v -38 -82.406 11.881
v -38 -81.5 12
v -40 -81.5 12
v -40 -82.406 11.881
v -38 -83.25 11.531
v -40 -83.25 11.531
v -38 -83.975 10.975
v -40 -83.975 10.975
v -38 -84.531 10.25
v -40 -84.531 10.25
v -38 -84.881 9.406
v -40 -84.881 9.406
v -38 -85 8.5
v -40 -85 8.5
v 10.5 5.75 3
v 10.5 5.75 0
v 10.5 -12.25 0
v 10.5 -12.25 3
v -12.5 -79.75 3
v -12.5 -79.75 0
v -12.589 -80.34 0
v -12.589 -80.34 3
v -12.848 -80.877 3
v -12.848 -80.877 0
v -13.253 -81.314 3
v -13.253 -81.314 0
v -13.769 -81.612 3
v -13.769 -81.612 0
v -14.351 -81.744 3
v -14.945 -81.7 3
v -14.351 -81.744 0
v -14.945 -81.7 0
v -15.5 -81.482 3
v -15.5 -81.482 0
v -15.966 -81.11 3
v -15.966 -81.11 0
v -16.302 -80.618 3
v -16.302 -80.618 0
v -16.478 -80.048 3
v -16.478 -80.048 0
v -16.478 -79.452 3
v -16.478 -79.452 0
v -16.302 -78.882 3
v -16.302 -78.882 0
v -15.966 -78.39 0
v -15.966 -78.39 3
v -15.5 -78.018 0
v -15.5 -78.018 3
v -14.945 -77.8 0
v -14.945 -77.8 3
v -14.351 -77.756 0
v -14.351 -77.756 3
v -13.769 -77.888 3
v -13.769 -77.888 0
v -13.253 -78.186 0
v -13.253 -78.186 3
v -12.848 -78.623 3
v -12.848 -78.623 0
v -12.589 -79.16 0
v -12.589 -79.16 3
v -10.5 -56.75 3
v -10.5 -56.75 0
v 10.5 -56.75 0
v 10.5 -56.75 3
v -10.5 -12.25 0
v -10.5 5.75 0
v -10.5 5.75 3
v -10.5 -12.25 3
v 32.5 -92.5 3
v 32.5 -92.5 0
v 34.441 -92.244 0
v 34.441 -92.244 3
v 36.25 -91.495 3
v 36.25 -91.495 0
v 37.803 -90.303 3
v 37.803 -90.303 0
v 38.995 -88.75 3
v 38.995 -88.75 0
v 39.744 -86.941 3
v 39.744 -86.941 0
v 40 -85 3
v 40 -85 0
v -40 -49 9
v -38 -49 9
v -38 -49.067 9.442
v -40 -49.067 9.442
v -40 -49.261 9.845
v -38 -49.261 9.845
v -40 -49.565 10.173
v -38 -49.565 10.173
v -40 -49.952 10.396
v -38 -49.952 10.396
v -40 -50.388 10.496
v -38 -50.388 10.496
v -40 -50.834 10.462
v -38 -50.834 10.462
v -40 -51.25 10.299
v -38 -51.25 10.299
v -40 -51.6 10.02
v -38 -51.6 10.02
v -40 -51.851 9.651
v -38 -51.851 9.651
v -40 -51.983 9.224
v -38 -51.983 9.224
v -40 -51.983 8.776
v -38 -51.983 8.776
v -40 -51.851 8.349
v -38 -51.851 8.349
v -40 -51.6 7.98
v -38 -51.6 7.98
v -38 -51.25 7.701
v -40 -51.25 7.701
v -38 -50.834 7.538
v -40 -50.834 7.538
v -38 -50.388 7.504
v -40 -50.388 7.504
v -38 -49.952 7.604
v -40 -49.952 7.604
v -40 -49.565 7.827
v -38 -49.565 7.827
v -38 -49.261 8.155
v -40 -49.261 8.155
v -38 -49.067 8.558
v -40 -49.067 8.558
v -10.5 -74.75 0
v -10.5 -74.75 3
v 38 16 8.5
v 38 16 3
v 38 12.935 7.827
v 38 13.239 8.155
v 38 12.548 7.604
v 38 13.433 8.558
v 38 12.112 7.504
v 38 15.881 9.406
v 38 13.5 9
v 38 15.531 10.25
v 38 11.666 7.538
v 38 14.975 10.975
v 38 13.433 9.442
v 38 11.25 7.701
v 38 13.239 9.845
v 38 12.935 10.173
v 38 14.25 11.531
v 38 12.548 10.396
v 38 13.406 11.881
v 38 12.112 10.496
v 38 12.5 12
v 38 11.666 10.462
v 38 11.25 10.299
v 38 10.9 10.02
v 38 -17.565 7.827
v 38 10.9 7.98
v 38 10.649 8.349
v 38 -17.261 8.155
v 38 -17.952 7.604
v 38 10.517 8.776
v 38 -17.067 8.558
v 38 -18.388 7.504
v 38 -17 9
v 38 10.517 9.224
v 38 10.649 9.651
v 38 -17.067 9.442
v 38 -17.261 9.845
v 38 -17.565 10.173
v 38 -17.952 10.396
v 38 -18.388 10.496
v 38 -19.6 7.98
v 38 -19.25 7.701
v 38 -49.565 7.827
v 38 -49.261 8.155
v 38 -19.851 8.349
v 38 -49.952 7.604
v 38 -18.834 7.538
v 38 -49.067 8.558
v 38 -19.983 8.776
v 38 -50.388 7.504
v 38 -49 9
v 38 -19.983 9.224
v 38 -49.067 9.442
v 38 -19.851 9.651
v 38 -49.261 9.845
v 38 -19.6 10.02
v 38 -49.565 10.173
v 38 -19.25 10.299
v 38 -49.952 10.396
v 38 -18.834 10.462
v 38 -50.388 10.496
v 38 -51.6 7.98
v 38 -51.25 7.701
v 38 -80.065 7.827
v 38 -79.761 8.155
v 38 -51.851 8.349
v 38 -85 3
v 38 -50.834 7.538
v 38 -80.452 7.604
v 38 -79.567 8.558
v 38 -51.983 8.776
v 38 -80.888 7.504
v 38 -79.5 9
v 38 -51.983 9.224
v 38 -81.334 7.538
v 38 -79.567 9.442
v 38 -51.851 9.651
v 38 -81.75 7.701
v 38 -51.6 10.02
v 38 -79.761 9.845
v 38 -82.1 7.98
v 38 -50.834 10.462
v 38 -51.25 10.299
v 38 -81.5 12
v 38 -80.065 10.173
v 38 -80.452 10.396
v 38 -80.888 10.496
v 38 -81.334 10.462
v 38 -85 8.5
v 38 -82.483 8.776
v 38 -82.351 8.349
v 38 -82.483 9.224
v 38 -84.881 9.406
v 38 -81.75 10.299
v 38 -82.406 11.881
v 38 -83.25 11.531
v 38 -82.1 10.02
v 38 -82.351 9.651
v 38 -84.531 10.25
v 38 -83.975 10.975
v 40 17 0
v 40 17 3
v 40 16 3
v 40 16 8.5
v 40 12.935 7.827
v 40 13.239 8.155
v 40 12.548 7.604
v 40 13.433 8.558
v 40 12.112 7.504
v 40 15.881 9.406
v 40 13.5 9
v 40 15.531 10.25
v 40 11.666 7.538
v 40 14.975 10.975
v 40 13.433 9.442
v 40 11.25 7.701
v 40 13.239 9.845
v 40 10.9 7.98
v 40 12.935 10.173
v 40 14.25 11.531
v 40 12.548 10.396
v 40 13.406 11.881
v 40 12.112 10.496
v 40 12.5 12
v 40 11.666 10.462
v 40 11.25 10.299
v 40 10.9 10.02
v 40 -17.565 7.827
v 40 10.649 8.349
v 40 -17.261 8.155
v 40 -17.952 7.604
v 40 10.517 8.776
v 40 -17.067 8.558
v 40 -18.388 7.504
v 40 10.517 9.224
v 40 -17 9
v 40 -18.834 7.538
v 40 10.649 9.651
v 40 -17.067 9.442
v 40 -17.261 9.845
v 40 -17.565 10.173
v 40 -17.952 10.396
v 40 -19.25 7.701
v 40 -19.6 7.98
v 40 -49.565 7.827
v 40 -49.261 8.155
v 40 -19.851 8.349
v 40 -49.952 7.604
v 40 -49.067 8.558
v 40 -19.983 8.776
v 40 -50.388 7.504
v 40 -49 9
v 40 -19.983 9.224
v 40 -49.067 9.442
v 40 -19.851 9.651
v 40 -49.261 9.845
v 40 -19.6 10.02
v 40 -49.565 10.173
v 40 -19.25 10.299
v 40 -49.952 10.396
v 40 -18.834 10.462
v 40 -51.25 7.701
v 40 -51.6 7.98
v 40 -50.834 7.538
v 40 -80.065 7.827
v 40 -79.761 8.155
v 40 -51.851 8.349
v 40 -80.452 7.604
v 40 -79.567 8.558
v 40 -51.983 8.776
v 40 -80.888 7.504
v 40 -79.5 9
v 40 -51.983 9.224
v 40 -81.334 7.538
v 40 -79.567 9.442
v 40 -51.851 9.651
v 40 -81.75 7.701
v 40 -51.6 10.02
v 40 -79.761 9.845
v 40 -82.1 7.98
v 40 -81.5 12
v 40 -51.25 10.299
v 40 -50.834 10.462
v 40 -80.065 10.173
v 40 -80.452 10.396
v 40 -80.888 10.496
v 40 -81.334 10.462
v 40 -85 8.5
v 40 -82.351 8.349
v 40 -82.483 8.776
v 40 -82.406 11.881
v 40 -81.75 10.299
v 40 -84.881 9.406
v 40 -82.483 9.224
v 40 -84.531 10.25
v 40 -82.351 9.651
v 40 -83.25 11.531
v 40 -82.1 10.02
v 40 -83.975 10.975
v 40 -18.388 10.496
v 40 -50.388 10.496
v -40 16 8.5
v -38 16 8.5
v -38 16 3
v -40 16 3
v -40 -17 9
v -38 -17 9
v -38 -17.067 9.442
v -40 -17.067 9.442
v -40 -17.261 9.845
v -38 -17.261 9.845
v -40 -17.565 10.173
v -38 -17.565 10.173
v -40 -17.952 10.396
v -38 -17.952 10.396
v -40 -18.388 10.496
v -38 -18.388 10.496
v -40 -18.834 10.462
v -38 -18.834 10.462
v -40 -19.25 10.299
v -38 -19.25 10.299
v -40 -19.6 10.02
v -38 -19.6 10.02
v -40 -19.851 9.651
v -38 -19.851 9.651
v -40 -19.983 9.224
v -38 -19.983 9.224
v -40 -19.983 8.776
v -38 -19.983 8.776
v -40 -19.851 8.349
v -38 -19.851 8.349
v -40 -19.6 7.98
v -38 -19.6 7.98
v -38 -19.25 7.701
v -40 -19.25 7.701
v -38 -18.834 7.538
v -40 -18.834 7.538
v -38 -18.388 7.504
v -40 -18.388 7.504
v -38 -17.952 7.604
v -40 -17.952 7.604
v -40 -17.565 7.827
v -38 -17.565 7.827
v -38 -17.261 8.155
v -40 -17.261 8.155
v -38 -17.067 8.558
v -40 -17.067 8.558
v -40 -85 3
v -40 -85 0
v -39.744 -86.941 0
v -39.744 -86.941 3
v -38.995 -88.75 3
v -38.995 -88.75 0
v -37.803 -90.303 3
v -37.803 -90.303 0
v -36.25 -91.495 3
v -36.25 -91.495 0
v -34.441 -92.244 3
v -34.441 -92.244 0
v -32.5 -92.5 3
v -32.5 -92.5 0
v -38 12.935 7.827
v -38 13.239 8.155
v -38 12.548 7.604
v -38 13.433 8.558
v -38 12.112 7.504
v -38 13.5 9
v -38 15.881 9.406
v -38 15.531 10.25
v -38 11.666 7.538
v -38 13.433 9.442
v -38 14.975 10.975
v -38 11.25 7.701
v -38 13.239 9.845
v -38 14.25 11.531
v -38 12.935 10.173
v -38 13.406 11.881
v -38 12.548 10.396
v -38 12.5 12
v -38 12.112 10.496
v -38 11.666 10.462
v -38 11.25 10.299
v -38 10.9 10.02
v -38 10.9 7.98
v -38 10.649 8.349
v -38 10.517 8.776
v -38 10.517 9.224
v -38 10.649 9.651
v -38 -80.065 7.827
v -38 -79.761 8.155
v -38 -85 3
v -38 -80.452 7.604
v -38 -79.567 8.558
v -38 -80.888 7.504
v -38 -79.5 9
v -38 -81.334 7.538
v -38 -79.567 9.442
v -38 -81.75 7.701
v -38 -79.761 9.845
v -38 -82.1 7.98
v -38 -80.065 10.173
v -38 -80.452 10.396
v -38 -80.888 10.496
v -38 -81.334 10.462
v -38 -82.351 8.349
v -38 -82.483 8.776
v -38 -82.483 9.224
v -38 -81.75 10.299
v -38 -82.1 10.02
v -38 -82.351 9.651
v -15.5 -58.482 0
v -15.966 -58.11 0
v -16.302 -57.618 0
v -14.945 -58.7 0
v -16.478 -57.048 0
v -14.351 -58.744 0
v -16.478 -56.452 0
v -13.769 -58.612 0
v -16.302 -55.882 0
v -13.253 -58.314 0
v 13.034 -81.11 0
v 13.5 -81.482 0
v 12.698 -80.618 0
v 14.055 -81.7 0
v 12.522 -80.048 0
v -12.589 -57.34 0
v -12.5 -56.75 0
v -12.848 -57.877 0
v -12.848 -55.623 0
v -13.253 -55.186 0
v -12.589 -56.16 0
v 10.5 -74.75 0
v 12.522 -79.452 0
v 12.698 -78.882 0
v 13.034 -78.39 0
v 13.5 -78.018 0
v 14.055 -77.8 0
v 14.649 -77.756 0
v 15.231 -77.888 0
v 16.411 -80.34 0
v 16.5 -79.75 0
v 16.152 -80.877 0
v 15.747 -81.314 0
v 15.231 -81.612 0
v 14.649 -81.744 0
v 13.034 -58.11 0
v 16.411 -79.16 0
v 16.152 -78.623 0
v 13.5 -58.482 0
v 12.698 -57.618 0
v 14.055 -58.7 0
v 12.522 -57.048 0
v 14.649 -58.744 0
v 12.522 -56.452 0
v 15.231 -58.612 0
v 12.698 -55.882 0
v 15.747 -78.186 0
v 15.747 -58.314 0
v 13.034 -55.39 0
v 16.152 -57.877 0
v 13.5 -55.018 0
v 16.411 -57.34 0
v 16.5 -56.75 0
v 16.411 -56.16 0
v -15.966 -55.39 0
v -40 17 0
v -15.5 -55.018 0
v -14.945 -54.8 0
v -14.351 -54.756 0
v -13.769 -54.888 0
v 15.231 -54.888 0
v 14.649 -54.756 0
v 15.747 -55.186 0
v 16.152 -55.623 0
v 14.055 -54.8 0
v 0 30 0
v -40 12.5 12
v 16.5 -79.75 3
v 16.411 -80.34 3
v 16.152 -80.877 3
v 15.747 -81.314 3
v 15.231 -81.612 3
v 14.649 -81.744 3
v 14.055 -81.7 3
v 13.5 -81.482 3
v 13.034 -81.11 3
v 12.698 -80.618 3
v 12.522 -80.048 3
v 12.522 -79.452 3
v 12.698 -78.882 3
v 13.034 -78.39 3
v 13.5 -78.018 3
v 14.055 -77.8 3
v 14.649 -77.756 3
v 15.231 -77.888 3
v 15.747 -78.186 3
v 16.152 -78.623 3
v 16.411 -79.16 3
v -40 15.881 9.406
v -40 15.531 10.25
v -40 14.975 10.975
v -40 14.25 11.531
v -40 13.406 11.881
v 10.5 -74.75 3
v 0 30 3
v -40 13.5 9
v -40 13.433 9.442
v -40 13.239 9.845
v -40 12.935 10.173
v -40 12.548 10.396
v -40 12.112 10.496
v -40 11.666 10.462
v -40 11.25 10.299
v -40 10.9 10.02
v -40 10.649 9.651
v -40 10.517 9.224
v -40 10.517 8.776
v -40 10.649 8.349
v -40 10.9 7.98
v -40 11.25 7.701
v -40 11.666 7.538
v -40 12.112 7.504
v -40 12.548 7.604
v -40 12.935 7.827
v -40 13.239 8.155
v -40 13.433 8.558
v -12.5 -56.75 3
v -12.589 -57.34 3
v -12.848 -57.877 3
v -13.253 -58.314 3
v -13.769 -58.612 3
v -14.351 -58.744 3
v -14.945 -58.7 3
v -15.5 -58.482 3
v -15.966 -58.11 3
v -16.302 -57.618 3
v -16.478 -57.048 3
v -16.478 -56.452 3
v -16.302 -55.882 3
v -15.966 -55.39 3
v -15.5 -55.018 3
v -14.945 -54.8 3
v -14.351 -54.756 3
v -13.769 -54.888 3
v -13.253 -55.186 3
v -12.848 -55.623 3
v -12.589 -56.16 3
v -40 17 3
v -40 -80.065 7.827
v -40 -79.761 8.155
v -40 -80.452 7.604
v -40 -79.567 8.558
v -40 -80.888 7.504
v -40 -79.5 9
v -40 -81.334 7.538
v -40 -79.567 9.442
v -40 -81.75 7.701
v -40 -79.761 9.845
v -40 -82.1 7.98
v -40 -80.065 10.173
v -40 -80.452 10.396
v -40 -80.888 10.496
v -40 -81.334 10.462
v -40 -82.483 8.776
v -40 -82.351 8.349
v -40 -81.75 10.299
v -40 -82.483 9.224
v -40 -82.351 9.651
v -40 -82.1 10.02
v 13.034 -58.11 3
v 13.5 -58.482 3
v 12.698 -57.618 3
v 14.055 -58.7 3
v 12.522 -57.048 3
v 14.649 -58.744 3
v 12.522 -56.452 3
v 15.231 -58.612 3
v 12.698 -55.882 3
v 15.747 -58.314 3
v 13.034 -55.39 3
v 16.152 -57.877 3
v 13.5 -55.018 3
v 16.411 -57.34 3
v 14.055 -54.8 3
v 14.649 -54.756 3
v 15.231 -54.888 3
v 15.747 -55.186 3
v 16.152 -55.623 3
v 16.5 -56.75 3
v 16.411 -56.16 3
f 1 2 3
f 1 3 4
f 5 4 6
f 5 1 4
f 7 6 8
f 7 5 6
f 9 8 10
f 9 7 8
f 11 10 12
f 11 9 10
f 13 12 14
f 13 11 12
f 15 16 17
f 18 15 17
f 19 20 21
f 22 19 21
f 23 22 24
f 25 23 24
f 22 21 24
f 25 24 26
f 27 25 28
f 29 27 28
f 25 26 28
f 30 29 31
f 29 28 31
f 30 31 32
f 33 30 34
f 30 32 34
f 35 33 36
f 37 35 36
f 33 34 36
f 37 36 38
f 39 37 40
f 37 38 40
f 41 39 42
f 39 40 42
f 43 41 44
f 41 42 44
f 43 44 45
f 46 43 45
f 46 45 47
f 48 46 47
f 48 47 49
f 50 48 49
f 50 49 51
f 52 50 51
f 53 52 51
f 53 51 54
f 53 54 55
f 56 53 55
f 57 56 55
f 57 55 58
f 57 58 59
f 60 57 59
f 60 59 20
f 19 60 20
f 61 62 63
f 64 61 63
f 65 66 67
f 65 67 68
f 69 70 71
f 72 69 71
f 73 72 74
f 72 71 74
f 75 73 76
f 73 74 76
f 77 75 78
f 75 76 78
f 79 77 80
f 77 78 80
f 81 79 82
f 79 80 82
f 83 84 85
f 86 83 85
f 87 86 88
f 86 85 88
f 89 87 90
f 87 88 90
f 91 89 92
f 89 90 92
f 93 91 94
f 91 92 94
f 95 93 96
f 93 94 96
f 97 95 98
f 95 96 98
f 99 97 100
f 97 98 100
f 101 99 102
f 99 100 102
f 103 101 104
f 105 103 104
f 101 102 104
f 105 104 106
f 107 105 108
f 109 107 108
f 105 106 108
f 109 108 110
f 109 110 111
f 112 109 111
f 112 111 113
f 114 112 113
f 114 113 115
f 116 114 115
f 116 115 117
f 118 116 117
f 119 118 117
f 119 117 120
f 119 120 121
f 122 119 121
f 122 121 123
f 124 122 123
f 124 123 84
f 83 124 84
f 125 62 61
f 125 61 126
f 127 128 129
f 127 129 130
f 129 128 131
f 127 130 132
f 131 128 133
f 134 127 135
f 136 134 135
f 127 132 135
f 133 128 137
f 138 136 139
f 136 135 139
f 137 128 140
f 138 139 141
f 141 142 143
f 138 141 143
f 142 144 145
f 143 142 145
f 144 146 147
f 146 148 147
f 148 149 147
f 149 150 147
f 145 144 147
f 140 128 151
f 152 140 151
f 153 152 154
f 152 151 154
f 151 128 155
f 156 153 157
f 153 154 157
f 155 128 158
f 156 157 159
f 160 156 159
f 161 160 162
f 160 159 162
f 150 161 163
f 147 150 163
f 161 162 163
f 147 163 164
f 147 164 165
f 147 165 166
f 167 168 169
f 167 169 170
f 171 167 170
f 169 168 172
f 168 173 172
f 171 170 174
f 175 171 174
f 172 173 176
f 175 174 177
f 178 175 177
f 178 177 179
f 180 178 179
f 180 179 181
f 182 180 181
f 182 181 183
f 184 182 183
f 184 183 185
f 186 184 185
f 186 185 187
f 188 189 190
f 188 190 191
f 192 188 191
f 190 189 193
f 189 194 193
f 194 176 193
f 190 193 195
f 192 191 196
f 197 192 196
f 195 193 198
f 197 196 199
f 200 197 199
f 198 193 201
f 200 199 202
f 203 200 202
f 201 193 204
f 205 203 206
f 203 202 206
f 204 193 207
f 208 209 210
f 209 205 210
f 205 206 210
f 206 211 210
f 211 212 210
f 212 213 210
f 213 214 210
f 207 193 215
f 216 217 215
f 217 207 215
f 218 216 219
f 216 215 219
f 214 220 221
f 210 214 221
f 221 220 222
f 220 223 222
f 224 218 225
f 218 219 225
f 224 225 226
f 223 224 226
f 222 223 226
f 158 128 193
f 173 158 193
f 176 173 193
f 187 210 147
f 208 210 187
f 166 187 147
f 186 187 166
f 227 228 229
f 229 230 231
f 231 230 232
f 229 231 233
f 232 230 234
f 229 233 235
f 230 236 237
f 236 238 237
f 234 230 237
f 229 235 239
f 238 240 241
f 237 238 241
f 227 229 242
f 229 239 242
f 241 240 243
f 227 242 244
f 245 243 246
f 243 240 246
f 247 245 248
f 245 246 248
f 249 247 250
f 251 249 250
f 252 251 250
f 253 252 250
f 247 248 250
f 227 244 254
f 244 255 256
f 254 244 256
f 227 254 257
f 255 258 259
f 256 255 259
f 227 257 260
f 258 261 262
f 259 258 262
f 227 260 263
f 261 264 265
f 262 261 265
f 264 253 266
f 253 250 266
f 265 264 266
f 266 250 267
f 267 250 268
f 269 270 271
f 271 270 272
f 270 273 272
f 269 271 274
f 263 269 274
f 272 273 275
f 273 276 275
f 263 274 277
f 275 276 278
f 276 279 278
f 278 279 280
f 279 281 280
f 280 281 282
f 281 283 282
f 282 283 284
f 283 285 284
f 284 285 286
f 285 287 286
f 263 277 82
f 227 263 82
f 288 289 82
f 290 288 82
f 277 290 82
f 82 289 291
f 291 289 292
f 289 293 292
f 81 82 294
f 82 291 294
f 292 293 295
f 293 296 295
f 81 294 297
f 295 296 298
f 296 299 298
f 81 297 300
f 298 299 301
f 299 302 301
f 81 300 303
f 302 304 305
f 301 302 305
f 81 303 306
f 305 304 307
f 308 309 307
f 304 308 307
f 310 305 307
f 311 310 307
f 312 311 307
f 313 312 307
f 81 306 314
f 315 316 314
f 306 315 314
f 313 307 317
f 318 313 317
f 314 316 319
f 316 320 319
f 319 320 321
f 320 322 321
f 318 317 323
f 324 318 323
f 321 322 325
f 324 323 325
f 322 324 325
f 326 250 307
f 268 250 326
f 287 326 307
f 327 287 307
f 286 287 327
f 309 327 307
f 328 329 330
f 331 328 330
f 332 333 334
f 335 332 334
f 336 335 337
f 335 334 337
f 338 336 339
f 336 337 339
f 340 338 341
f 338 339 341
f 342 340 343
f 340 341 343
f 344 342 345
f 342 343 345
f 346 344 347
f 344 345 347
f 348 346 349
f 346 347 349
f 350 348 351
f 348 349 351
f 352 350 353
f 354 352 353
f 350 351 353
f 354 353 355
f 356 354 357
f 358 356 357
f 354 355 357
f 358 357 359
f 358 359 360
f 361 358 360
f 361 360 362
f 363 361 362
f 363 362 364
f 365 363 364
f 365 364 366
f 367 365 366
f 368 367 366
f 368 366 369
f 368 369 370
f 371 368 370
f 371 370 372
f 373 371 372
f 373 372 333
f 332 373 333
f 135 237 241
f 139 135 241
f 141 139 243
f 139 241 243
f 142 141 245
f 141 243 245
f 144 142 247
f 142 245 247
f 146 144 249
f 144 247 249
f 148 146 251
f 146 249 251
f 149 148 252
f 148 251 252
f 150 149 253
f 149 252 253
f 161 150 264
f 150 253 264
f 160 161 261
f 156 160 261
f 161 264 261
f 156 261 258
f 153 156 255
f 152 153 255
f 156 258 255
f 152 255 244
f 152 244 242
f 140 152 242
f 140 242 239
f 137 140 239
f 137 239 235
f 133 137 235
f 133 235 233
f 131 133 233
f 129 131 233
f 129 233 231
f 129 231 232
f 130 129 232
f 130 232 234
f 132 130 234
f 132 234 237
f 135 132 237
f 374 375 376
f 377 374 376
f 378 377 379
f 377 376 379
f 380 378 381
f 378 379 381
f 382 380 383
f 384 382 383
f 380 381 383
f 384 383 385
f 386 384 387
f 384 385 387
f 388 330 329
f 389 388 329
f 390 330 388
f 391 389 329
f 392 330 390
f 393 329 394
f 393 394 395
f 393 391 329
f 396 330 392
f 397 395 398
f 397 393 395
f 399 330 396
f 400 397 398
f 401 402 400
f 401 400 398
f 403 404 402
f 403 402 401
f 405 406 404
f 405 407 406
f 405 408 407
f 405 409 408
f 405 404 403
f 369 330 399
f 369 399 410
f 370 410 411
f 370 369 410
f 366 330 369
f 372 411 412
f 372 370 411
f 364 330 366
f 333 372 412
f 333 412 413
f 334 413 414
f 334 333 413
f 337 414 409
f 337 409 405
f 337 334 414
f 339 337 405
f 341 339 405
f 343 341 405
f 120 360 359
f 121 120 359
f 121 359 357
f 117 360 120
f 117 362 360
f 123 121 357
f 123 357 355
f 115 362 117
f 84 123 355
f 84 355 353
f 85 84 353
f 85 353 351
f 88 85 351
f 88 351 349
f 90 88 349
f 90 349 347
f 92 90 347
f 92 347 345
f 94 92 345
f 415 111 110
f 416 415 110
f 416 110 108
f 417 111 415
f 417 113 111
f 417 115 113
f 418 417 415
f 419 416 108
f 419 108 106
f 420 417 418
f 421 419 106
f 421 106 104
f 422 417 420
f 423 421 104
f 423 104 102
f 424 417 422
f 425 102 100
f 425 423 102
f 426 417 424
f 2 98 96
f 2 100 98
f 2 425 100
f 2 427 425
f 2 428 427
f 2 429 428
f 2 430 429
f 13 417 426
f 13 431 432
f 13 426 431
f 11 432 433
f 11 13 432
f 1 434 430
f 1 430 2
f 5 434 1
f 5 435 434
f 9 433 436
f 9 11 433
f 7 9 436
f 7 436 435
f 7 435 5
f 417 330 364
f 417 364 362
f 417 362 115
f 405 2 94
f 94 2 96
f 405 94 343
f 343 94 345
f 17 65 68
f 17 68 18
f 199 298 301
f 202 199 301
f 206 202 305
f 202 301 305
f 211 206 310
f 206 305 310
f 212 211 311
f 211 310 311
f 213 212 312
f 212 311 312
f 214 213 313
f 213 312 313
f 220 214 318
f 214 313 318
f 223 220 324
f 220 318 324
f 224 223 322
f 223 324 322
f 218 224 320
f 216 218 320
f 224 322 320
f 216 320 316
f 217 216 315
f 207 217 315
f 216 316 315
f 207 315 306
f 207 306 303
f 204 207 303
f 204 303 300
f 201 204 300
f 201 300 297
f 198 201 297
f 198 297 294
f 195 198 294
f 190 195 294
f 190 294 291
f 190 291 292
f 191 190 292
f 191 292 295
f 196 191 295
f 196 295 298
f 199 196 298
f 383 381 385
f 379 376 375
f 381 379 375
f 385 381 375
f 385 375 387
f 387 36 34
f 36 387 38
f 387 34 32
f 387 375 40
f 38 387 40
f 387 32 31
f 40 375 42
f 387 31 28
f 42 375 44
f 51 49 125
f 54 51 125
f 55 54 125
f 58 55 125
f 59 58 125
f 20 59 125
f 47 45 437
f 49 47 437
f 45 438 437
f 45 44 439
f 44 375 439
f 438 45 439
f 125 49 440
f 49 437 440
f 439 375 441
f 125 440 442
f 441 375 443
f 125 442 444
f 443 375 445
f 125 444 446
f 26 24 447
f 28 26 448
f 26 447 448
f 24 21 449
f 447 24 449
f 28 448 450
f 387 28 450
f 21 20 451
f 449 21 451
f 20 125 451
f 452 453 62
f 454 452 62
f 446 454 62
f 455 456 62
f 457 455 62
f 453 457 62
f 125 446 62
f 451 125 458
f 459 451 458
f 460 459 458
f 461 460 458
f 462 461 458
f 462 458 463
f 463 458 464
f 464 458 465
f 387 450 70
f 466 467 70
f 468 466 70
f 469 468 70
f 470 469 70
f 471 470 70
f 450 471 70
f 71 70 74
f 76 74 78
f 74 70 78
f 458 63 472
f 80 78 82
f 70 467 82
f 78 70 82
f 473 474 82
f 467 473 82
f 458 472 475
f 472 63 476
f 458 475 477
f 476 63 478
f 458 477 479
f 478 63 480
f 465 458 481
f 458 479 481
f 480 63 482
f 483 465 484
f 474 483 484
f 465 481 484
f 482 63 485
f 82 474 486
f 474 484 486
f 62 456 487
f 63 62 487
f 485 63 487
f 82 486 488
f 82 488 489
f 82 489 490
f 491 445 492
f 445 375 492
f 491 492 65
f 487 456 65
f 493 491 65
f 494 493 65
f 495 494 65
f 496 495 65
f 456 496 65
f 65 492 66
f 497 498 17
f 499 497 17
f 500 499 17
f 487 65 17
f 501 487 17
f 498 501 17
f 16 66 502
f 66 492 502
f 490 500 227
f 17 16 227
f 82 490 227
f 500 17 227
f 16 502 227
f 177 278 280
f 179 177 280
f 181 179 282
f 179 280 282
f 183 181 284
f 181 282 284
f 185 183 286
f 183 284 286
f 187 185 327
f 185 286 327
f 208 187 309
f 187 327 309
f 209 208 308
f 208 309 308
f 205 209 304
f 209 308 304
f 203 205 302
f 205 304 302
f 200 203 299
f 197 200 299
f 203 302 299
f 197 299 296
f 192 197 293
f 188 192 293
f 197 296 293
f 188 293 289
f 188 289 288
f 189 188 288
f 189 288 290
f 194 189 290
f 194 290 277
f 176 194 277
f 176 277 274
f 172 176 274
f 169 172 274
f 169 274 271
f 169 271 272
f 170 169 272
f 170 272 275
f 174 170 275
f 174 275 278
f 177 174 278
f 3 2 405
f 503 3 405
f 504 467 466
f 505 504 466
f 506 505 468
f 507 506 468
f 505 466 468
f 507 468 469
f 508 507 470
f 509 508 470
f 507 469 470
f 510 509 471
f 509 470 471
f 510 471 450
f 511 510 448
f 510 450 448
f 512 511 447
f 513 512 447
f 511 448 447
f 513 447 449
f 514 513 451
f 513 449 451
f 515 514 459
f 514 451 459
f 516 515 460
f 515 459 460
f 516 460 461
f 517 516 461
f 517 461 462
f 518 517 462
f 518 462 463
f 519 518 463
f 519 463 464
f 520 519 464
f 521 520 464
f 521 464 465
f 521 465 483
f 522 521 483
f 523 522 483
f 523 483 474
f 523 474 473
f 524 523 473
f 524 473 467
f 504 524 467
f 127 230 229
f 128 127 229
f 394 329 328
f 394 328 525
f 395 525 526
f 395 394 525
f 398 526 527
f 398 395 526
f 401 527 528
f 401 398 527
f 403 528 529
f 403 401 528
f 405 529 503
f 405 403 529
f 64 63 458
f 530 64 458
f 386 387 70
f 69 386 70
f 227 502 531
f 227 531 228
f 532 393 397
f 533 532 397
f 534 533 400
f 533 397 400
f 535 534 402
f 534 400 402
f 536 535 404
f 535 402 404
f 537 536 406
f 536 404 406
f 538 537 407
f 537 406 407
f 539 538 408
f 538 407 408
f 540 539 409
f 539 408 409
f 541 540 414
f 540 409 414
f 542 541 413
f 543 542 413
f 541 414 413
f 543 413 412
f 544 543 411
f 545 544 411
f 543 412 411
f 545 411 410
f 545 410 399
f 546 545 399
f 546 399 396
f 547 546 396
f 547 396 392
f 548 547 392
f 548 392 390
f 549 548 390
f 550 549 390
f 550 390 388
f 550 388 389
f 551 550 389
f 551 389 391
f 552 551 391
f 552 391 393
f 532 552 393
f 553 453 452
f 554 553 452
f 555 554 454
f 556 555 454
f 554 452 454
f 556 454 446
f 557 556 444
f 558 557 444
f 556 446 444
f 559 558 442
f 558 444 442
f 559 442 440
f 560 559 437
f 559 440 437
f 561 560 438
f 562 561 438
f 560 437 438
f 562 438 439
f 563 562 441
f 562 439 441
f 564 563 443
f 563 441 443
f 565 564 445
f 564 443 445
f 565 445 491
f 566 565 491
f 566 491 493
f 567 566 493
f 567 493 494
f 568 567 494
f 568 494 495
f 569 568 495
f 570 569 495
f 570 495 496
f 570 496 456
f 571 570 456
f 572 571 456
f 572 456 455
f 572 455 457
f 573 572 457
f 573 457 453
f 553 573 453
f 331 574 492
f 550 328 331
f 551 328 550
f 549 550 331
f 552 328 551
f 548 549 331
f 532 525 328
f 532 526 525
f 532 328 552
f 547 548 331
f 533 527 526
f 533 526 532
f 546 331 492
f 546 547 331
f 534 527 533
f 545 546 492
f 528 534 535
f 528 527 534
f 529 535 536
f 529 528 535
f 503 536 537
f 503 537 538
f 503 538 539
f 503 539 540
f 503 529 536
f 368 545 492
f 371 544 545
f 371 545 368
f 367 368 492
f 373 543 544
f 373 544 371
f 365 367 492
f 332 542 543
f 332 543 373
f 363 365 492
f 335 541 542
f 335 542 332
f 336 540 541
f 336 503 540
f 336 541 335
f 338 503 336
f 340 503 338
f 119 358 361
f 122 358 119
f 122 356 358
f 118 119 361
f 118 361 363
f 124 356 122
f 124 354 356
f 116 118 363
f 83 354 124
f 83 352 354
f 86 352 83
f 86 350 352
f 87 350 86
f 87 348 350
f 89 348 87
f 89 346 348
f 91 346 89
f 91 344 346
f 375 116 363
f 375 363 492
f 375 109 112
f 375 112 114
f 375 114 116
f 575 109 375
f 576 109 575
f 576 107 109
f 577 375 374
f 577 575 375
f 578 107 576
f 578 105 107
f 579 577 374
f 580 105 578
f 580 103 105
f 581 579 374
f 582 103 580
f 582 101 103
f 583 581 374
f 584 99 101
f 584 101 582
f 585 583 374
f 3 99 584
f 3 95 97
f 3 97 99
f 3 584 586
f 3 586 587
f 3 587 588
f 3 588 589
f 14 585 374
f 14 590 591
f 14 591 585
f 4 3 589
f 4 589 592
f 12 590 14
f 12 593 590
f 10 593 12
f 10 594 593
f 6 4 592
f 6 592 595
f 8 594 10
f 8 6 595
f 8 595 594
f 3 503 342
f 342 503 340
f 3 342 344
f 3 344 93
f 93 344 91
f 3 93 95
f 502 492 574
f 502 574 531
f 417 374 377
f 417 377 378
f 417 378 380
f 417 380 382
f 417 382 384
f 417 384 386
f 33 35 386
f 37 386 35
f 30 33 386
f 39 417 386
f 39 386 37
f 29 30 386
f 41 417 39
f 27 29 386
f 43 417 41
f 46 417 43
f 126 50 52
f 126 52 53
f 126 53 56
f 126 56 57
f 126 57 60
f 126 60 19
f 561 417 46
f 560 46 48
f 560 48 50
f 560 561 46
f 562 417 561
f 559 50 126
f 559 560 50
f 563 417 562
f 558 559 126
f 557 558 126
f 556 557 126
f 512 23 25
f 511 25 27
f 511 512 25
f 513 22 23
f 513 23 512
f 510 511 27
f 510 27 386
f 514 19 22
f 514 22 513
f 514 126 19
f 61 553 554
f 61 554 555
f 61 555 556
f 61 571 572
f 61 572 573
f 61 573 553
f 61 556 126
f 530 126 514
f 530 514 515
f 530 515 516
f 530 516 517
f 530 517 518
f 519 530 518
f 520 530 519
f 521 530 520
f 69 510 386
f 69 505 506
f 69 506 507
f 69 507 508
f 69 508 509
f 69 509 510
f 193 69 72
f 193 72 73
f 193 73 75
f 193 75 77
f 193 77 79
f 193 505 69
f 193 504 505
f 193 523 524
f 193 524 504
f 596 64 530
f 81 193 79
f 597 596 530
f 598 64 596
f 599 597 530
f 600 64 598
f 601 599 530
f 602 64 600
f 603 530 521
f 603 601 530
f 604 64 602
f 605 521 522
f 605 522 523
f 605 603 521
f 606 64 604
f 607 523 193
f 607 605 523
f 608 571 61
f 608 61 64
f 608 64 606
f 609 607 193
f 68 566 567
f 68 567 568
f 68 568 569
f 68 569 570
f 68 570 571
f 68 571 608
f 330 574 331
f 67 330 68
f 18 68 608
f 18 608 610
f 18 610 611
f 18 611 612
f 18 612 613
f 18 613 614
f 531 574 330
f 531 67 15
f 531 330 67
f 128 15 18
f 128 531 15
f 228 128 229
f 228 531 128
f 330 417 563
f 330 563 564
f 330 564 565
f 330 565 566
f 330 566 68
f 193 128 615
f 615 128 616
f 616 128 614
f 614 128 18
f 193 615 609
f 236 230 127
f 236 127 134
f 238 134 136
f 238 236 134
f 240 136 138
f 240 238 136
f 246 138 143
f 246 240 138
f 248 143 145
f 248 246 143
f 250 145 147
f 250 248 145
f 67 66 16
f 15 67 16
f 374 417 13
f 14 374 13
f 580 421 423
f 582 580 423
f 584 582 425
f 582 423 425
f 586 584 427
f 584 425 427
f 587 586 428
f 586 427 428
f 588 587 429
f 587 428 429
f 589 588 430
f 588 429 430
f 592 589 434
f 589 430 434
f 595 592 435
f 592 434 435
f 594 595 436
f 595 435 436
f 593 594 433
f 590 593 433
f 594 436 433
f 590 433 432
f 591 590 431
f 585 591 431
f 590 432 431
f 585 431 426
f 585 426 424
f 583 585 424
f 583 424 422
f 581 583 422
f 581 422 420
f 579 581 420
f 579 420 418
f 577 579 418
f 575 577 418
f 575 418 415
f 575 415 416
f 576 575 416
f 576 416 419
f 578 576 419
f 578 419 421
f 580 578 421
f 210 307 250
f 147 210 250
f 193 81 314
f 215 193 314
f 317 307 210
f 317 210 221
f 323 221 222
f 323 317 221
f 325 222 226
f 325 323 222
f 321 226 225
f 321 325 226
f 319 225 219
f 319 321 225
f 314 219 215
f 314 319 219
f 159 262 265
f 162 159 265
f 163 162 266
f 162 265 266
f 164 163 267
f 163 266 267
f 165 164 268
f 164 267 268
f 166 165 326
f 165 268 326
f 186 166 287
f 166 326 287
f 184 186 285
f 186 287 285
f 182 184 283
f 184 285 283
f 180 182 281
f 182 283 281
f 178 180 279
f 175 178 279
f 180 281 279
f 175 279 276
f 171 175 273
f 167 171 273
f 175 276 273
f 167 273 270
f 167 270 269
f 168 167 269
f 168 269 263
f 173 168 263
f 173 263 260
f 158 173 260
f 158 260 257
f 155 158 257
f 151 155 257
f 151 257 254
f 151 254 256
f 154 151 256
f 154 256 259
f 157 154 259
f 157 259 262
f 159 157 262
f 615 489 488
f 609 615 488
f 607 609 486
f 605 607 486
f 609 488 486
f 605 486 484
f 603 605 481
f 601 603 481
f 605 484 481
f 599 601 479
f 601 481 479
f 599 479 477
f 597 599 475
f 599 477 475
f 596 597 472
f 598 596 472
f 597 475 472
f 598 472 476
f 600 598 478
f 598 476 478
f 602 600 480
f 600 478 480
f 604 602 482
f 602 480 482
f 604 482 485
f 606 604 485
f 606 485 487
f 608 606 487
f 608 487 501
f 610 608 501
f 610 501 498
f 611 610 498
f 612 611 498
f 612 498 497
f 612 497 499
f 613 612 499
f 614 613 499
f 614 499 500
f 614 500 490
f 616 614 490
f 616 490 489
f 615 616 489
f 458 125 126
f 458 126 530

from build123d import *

# Parameters (mm, degrees)
PAD_DEPTH       = 3
SKETCH001_R     = 1.5
PAD001_DEPTH    = 80
SKETCH002_W     = 76
SKETCH002_H     = 10
POCKET_DEPTH    = 700
SKETCH003_R     = 2
SKETCH003_W     = 21
SKETCH003_H     = 18
POCKET001_DEPTH = 5


with BuildPart() as part:
    # Sketch → Pad (new body)
    with BuildSketch(Plane.XY):
        with BuildLine():
            Line((-40, 0), (-40, -85))
            ThreePointArc((-40, -85), (-37.803301, -90.303301), (-32.5, -92.5))
            Line((-32.5, -92.5), (32.5, -92.5))
            ThreePointArc((32.5, -92.5), (37.803301, -90.303301), (40, -85))
            Line((40, 0), (40, -85))
            Line((40, 0), (40, 17))
            Line((0, 30), (40, 17))
            Line((-40, 17), (0, 30))
            Line((-40, 0), (-40, 17))
        make_face()
    extrude(amount=PAD_DEPTH)

    # Sketch001 (on Face6 of Pad) → Pad001 (join)
    with BuildSketch(Plane.YZ.offset(40)):
        with BuildLine():
            Line((-81.5, 12), (12.5, 12))
            ThreePointArc((16, 8.5), (14.974874, 10.974874), (12.5, 12))
            Line((16, 8.5), (16, 0))
            Line((16, 0), (-85, 0))
            Line((-85, 0), (-85, 8.5))
            ThreePointArc((-81.5, 12), (-83.974874, 10.974874), (-85, 8.5))
        make_face()
        with Locations((-81, 9)):
            Circle(SKETCH001_R, mode=Mode.SUBTRACT)
        with Locations((-50.5, 9)):
            Circle(SKETCH001_R, mode=Mode.SUBTRACT)
        with Locations((-18.5, 9)):
            Circle(SKETCH001_R, mode=Mode.SUBTRACT)
        with Locations((12, 9)):
            Circle(SKETCH001_R, mode=Mode.SUBTRACT)
    extrude(amount=-PAD001_DEPTH)

    # Sketch002 (on Face7 of Pad001) → Pocket (cut)
    with BuildSketch(Plane.XZ.offset(92.5)):
        with Locations((0, 8)):
            Rectangle(SKETCH002_W, SKETCH002_H)
    extrude(amount=-POCKET_DEPTH, mode=Mode.SUBTRACT)

    # Sketch003 (on Face4 of Pocket) → Pocket001 (cut)
    with BuildSketch(Plane(origin=(0, 0, 0), x_dir=(1, 0, 0), z_dir=(0, 0, -1))):
        with Locations((14.5, 79.75)):
            Circle(SKETCH003_R)
        with Locations((-14.5, 79.75)):
            Circle(SKETCH003_R)
        with Locations((-14.5, 56.75)):
            Circle(SKETCH003_R)
        with Locations((14.5, 56.75)):
            Circle(SKETCH003_R)
        with Locations((0, 65.75)):
            Rectangle(SKETCH003_W, SKETCH003_H)
        with Locations((0, 3.25)):
            Rectangle(SKETCH003_W, SKETCH003_H)
    extrude(amount=-POCKET001_DEPTH, mode=Mode.SUBTRACT)


solid = part.part
